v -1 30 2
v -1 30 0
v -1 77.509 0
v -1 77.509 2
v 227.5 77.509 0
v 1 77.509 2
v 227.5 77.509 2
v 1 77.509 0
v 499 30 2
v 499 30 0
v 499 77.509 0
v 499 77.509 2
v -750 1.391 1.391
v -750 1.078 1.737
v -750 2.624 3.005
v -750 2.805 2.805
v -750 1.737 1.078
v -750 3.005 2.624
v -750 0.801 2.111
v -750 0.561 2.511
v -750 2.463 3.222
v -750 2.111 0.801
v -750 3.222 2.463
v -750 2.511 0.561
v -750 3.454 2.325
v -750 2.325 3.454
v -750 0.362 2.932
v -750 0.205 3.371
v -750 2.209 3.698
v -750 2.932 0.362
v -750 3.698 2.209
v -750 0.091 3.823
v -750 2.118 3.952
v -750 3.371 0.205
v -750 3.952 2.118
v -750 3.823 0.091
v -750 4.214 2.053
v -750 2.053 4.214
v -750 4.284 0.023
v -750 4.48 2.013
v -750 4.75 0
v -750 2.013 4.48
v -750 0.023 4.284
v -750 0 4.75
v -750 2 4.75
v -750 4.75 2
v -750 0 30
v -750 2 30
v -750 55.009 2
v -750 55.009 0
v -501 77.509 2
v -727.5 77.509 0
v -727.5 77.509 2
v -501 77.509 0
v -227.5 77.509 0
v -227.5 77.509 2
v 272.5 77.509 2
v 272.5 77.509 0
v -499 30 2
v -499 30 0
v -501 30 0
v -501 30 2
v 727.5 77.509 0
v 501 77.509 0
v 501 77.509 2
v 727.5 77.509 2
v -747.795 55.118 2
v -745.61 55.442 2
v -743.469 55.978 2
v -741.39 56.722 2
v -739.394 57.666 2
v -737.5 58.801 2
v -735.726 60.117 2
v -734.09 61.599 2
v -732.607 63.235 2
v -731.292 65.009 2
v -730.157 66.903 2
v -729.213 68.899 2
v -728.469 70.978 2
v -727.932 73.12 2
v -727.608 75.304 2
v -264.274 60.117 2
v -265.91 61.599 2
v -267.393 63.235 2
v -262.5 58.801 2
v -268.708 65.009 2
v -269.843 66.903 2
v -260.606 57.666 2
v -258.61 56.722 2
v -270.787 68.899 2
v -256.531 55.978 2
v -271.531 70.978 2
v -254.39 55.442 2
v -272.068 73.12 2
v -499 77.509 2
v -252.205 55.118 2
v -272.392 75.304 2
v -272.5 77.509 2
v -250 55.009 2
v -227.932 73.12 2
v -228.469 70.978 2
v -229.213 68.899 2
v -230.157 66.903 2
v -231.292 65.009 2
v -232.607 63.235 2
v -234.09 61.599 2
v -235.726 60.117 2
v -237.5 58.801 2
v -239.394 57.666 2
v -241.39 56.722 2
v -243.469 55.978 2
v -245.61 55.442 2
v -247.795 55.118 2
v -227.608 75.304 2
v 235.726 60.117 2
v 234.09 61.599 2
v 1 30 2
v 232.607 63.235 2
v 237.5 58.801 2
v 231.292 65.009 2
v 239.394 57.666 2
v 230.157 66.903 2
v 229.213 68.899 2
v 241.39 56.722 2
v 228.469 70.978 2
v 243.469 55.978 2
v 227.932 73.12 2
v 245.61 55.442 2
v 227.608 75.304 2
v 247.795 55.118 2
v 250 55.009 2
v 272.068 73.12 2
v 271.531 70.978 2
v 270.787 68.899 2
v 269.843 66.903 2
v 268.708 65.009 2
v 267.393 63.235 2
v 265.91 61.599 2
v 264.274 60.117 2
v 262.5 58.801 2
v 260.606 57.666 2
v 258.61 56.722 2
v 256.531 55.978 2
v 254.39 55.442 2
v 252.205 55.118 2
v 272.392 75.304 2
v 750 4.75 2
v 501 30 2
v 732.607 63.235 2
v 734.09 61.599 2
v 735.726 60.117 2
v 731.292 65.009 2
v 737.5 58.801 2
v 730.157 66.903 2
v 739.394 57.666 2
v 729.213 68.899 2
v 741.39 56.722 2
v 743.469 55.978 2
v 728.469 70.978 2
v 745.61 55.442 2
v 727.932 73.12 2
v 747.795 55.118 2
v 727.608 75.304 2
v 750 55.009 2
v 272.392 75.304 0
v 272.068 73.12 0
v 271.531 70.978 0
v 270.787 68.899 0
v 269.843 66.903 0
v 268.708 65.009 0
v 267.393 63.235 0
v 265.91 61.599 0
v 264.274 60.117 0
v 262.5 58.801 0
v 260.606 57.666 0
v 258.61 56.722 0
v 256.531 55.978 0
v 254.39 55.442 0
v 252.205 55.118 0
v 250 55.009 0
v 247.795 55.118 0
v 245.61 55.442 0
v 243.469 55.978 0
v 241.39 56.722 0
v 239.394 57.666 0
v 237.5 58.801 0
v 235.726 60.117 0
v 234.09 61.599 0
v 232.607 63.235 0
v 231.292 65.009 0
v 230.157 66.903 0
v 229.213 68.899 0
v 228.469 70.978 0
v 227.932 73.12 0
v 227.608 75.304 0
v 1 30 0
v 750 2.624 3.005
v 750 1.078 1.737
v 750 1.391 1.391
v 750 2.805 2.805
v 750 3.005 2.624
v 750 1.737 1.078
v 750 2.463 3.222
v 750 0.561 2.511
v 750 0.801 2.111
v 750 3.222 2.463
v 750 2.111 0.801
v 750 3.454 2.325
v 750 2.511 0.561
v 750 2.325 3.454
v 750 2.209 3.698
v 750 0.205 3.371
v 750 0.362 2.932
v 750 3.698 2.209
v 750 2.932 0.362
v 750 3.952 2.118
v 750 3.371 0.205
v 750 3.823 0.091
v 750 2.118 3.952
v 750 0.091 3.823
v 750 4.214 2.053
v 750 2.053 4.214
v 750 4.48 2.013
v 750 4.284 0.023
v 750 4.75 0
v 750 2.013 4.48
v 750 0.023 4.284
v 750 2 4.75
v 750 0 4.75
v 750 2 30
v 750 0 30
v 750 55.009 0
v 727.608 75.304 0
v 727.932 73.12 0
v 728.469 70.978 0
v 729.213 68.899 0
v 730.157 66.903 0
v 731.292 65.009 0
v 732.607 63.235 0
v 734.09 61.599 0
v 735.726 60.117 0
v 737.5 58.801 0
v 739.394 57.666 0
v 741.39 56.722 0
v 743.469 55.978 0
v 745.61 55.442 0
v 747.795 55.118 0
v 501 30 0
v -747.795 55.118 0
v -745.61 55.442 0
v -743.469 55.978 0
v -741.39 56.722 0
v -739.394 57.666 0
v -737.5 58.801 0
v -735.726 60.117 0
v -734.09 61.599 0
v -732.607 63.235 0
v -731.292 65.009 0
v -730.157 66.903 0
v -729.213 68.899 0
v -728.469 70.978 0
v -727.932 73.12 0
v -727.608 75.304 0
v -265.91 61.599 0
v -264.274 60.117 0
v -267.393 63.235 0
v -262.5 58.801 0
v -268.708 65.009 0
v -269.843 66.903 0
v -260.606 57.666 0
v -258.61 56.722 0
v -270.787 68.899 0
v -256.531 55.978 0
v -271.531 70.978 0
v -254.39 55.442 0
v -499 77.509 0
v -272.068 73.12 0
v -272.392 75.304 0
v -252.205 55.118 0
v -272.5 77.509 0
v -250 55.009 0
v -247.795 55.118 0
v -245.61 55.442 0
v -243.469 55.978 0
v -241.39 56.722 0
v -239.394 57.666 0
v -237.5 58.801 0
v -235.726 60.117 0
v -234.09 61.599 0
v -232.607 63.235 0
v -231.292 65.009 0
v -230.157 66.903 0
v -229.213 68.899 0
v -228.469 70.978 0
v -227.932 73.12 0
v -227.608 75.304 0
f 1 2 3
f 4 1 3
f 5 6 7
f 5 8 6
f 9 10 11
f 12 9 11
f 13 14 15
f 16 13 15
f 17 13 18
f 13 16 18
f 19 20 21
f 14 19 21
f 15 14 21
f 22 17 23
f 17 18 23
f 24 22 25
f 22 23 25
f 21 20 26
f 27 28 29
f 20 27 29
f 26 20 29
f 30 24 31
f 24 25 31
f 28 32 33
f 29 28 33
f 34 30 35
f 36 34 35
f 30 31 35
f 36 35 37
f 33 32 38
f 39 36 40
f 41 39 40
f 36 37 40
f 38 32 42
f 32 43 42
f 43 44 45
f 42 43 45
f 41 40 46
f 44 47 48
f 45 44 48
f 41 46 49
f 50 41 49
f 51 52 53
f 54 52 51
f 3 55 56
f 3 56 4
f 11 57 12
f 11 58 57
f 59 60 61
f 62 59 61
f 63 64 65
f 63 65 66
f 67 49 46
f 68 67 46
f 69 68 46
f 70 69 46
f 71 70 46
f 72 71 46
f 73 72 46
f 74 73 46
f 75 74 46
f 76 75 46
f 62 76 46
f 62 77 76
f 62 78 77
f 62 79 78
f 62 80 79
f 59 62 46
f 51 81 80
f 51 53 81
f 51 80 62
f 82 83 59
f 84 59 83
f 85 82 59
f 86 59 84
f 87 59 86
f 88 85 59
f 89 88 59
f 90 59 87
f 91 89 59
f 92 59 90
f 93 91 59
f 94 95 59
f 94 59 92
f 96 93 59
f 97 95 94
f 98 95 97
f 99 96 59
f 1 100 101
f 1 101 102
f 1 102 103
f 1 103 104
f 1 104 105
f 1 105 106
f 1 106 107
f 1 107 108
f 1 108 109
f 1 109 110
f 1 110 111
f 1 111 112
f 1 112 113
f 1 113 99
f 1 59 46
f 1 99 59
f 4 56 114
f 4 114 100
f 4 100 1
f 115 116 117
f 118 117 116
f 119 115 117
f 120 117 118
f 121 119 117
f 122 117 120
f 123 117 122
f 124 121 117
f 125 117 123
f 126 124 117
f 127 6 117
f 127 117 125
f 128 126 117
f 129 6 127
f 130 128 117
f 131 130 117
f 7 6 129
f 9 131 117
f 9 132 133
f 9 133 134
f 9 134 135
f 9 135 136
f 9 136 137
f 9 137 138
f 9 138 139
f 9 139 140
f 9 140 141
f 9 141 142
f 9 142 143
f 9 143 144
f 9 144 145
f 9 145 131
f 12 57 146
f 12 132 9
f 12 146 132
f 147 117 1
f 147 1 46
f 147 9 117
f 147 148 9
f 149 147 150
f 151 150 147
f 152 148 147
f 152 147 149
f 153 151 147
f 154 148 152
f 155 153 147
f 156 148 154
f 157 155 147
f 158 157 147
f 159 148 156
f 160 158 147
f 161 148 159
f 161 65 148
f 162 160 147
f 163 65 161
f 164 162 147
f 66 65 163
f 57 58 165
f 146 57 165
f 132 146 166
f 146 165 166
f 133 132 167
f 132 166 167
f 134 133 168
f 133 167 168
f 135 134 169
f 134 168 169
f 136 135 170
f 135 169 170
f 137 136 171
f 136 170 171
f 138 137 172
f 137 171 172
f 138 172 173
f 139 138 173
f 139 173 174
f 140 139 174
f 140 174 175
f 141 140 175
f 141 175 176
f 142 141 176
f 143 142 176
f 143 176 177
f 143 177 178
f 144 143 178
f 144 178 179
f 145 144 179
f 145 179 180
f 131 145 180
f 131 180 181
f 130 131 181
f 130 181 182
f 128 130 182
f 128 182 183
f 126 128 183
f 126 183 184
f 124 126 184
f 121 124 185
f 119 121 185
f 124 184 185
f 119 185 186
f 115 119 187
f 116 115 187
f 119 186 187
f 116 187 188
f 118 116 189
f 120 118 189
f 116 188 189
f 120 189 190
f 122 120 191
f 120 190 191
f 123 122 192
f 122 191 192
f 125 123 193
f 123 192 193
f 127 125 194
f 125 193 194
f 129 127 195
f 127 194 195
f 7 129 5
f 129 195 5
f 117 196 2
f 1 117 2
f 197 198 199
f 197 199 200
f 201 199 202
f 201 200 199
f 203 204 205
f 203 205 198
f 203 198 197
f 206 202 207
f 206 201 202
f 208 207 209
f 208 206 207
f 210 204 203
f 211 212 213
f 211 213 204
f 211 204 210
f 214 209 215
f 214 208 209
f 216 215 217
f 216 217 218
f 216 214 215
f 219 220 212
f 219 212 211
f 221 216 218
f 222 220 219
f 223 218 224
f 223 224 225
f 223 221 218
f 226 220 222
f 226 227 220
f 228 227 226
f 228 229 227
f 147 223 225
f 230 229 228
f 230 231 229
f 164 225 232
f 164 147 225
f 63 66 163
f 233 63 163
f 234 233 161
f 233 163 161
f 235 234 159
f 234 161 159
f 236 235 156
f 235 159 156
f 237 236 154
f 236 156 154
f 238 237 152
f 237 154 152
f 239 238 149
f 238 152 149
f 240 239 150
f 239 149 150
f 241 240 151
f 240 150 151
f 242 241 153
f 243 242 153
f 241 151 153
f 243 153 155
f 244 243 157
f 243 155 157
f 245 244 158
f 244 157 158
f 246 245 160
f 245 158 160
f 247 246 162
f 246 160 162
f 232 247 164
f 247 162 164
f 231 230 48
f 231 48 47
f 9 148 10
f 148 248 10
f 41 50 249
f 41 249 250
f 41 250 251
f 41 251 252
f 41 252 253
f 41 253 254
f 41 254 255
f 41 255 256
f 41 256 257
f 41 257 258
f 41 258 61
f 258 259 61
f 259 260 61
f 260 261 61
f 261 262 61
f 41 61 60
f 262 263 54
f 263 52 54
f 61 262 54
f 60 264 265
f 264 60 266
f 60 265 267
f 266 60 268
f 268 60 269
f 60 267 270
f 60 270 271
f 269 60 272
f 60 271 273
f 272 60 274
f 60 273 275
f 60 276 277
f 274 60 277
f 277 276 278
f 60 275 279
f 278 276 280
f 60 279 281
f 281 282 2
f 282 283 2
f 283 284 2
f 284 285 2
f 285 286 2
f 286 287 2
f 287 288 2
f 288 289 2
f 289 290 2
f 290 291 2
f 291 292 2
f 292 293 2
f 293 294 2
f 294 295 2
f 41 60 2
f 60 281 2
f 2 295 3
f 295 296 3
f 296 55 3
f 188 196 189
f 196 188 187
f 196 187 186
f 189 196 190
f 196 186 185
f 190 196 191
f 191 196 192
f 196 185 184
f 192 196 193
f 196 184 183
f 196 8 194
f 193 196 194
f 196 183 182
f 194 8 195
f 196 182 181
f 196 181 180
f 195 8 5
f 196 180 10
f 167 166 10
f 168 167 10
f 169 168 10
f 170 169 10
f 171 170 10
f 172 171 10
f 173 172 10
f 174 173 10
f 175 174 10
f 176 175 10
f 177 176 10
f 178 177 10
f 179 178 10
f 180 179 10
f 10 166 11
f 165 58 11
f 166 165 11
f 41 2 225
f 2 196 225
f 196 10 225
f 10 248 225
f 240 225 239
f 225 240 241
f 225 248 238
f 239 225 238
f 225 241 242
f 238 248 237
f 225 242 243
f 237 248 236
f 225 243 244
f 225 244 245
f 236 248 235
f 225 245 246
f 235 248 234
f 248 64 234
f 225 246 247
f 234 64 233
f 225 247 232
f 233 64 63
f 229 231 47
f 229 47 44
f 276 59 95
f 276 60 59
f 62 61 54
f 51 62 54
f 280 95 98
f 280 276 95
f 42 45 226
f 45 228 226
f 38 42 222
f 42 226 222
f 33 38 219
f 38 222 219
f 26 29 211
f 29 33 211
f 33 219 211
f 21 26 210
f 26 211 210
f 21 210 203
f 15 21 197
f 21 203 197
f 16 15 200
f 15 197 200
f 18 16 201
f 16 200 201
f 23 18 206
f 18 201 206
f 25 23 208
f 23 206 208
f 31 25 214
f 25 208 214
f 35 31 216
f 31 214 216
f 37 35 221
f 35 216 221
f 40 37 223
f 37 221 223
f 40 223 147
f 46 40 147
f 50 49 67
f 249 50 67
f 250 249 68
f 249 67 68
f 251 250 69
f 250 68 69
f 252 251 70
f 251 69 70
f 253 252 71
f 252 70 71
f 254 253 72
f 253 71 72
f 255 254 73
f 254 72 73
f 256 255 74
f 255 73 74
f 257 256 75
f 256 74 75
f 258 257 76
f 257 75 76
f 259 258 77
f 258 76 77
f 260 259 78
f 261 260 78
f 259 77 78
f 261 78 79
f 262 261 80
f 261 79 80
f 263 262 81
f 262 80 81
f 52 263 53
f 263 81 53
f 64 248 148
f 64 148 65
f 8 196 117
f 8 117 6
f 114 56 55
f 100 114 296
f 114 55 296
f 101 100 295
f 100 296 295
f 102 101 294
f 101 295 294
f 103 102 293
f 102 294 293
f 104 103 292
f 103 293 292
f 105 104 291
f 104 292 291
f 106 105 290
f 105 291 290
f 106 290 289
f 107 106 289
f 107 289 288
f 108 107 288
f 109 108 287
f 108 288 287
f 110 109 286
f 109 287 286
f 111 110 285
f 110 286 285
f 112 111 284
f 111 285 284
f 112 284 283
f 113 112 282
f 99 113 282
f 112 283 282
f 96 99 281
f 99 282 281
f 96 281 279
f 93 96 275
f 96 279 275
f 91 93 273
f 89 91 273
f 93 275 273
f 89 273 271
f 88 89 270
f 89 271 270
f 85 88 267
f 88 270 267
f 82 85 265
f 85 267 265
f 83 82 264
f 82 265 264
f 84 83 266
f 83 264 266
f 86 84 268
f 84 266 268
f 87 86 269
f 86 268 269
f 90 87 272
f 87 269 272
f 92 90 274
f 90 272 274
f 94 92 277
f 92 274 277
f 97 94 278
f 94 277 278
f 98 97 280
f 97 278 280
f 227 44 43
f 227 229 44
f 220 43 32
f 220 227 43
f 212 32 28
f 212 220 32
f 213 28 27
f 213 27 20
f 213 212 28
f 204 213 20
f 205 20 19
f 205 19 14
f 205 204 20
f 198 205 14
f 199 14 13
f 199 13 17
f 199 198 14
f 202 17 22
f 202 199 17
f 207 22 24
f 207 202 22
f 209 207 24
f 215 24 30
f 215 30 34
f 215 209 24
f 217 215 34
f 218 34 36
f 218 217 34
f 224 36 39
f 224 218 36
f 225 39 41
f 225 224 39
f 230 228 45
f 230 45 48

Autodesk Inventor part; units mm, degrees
ref_plane "YZ Plane" through (0, 0, 0) normal (1, 0, 0) x (0, 1, 0)
ref_plane "XZ Plane" through (0, 0, 0) normal (0, 1, 0) x (-1, 0, 0)
ref_plane "XY Plane" through (0, 0, 0) normal (0, 0, 1) x (1, 0, 0)
sketch "Sketch1" plane through (0, 0, 0) normal (0, 0, 1) x (1, 0, 0)
  line L0 (-750, 77.5093) -> (750, 77.5093)
  line L1 (750, 77.5093) -> (750, 0)
  line L2 (750, 0) -> (-750, 0)
  line L3 (-750, 0) -> (-750, 77.5093)
  point P0 (0, 0)
  point P1 (0, 0)
  dimension "d0" = 1500
  dimension "d1" = 77.5093
extrude "Plate1" add sketch "Sketch1" along normal blind 2
sketch "Sketch2" plane through (750, 2, 0) normal (0, -1, 0) x (1, 0, 0)
  line L0 (-1500, 0) -> (0, 0)
  line L1 (0, 0) -> (0, 30)
  line L2 (0, 30) -> (-1500, 30)
  line L3 (-1500, 30) -> (-1500, 0)
edge flange "Flange1" height 30 angle 90 thickness 2 bend radius 2.75 thickness toward (0, -1, 0) relief round relief width 2 relief depth 1 edges at (0, 0, 2) wall of the first edge with corners at (-750, 2, 0) (750, 2, 0) (750, 2, 30) (-750, 2, 30)
bend "Bend1"
corner "Corner1"
sketch "Sketch5" plane through (0, 0, 0) normal (0, 0, -1) x (-1, 0, 0)
  line L0 (750, 77.5093) -> (-750, 77.5093) projected
  line L1 (-1, 30) -> (-1, 77.5093)
  line L2 (750, 0) -> (-750, 0) projected
  line L3 (-1, 30) -> (1, 30)
  line L4 (1, 30) -> (1, 77.5093)
  point P0 (0, 0)
  point P1 (0, 30)
  point P2 (0, 0)
  dimension "d27" = 2
  dimension "d28" = 30
extrude "Extrusion1" cut sketch "Sketch5" against normal through all
pattern_linear "Rectangular Pattern1" count 3 spacing 500 along (1, 0, 0) of "Extrusion1" first direction both ways yes
sketch "Sketch6" plane through (0, 0, 0) normal (0, 0, -1) x (-1, 0, 0)
  line L0 (-750, 77.5093) -> (-750, 4.75) projected
  circle A0 centre (-750, 77.5093) radius 22.5
  line L1 (-750, 77.5093) -> (750, 77.5093) projected
  line L2 (-1, 77.5093) -> (-1, 30) projected
  line L3 (-499, 77.5093) -> (-499, 30) projected
  line L4 (-1, 30) -> (-499, 30) construction
  circle A1 centre (-250, 77.5093) radius 22.5
  point P0 (0, 0)
  point P1 (-727.5, 77.5093)
  point P2 (-750, 55.0093)
  point P3 (-250, 30)
  dimension "d24" = 45
extrude "Extrusion2" cut sketch "Sketch6" along normal mid plane 30 contours L1 A0 L0 | A1 L1 | L1 A1 picked at (-748.3311, 62.6973)
mirror "Mirror1" about plane through (0, 0, 0) normal (1, 0, 0) of "Extrusion2"
sketch "Sketch7" plane through (0, 0, 2) normal (0, 0, 1) x (1, 0, 0)
  arc A0 (-750, 55.0093) -> (-727.5, 77.5093) centre (-750, 77.5093) ccw projected
  line L0 (-750, 4.75) -> (-750, 55.0093) projected
  line L1 (-750, 4.75) -> (750, 4.75) projected
  line L2 (750, 55.0093) -> (750, 4.75) projected
  arc A1 (727.5, 77.5093) -> (750, 55.0093) centre (750, 77.5093) ccw projected
  line L3 (501, 77.5093) -> (727.5, 77.5093) projected
  line L4 (501, 77.5093) -> (501, 30) projected
  line L5 (501, 30) -> (499, 30) projected
  line L6 (499, 30) -> (499, 77.5093) projected
  line L7 (1, 77.5093) -> (227.5, 77.5093) projected
  line L8 (1, 77.5093) -> (1, 30) projected
  line L9 (1, 30) -> (-1, 30) projected
  line L10 (-1, 30) -> (-1, 77.5093) projected
  line L11 (-499, 77.5093) -> (-272.5, 77.5093) projected
  line L12 (-499, 77.5093) -> (-499, 30) projected
  line L13 (-499, 30) -> (-501, 30) projected
  line L14 (-501, 30) -> (-501, 77.5093) projected
  line L15 (-727.5, 77.5093) -> (-501, 77.5093) projected
  line L16 (750, 4.75) -> (-750, 4.75) projected
  line L17 (650, 4.75) -> (650, 77.5093) construction
  line L18 (-750, 4.75) -> (750, 4.75) projected
  line L19 (646, 37.6655) -> (650, 44.5938)
  line L20 (650, 44.5938) -> (654, 37.6655)
  line L21 (654, 37.6655) -> (646, 37.6655)
  line L22 (650, 44.5938) -> (650, 37.6655) construction
  line L23 (626, 37.6655) -> (630, 44.5938)
  line L24 (630, 44.5938) -> (634, 37.6655)
  line L25 (634, 37.6655) -> (626, 37.6655)
  line L26 (630, 44.5938) -> (630, 37.6655) construction
  line L27 (272.5, 77.5093) -> (499, 77.5093) projected
  arc A2 (227.5, 77.5093) -> (272.5, 77.5093) centre (250, 77.5093) ccw projected
  line L28 (-227.5, 77.5093) -> (-1, 77.5093) projected
  arc A3 (-272.5, 77.5093) -> (-227.5, 77.5093) centre (-250, 77.5093) ccw projected
  point P0 (0, 0)
  point P1 (650, 41.1296)
  point P2 (630, 41.1296)
  dimension "d29" = 100
  dimension "d30" = 8
  dimension "d31" = 8
  dimension "d32" = 20
extrude "Extrusion3" [suppressed]
mirror "Mirror2" [suppressed]
sketch "Sketch8" plane through (0, 0, 2) normal (0, 0, 1) x (1, 0, 0)
  line L0 (496, 72.5093) -> (496, 60.5093) construction
  line L1 (496, 60.5093) -> (296, 60.5093) construction
  line L2 (296, 60.5093) -> (296, 72.5093) construction
  line L3 (296, 72.5093) -> (496, 72.5093) construction
  line L4 (501, 77.5093) -> (727.5, 77.5093) projected
  line L5 (272.5, 77.5093) -> (499, 77.5093) projected
  point P0 (0, 0)
  dimension "d35" = 200
  dimension "d36" = 12
  dimension "d39" = 3
  dimension "d40" = 5
mark "Mark1"
equation "\"d28\" = Стрингер_глубина_паза"
equation "\"d1\" = Стрингер_6"
equation "\"d27\" = d18"
equation "\"d2\" = Thickness"
equation "\"d3\" = BendReliefWidth"
equation "\"d4\" = BendReliefDepth"
equation "\"d5\" = MinimumRemnant"
equation "\"d6\" = TransitionRadius"
equation "\"d9\" = BendRadius"
equation "\"d10\" = CornerReliefSize"
equation "\"d11\" = GapSize"
equation "\"d12\" = JacobiRadiusSize"
equation "\"BendReliefWidth\" = Thickness"
equation "\"BendReliefDepth\" = 0.5 * Thickness"
equation "\"CornerReliefSize\" = 4 * Thickness"
equation "\"MinimumRemnant\" = 2 * Thickness"
equation "\"TransitionRadius\" = BendRadius"
equation "\"JacobiRadiusSize\" = BendRadius"
equation "\"GapSize\" = Thickness"
equation "\"d18\" = Thickness"
equation "\"Стрингер_6\" = 77.509299"
equation "\"Thickness\" = 2"
equation "\"BendRadius\" = 2.75"
equation "\"Стрингер_глубина_паза\" = 30"
properties part number "MSC 066 stringer board ####" material "Stainless Steel"
